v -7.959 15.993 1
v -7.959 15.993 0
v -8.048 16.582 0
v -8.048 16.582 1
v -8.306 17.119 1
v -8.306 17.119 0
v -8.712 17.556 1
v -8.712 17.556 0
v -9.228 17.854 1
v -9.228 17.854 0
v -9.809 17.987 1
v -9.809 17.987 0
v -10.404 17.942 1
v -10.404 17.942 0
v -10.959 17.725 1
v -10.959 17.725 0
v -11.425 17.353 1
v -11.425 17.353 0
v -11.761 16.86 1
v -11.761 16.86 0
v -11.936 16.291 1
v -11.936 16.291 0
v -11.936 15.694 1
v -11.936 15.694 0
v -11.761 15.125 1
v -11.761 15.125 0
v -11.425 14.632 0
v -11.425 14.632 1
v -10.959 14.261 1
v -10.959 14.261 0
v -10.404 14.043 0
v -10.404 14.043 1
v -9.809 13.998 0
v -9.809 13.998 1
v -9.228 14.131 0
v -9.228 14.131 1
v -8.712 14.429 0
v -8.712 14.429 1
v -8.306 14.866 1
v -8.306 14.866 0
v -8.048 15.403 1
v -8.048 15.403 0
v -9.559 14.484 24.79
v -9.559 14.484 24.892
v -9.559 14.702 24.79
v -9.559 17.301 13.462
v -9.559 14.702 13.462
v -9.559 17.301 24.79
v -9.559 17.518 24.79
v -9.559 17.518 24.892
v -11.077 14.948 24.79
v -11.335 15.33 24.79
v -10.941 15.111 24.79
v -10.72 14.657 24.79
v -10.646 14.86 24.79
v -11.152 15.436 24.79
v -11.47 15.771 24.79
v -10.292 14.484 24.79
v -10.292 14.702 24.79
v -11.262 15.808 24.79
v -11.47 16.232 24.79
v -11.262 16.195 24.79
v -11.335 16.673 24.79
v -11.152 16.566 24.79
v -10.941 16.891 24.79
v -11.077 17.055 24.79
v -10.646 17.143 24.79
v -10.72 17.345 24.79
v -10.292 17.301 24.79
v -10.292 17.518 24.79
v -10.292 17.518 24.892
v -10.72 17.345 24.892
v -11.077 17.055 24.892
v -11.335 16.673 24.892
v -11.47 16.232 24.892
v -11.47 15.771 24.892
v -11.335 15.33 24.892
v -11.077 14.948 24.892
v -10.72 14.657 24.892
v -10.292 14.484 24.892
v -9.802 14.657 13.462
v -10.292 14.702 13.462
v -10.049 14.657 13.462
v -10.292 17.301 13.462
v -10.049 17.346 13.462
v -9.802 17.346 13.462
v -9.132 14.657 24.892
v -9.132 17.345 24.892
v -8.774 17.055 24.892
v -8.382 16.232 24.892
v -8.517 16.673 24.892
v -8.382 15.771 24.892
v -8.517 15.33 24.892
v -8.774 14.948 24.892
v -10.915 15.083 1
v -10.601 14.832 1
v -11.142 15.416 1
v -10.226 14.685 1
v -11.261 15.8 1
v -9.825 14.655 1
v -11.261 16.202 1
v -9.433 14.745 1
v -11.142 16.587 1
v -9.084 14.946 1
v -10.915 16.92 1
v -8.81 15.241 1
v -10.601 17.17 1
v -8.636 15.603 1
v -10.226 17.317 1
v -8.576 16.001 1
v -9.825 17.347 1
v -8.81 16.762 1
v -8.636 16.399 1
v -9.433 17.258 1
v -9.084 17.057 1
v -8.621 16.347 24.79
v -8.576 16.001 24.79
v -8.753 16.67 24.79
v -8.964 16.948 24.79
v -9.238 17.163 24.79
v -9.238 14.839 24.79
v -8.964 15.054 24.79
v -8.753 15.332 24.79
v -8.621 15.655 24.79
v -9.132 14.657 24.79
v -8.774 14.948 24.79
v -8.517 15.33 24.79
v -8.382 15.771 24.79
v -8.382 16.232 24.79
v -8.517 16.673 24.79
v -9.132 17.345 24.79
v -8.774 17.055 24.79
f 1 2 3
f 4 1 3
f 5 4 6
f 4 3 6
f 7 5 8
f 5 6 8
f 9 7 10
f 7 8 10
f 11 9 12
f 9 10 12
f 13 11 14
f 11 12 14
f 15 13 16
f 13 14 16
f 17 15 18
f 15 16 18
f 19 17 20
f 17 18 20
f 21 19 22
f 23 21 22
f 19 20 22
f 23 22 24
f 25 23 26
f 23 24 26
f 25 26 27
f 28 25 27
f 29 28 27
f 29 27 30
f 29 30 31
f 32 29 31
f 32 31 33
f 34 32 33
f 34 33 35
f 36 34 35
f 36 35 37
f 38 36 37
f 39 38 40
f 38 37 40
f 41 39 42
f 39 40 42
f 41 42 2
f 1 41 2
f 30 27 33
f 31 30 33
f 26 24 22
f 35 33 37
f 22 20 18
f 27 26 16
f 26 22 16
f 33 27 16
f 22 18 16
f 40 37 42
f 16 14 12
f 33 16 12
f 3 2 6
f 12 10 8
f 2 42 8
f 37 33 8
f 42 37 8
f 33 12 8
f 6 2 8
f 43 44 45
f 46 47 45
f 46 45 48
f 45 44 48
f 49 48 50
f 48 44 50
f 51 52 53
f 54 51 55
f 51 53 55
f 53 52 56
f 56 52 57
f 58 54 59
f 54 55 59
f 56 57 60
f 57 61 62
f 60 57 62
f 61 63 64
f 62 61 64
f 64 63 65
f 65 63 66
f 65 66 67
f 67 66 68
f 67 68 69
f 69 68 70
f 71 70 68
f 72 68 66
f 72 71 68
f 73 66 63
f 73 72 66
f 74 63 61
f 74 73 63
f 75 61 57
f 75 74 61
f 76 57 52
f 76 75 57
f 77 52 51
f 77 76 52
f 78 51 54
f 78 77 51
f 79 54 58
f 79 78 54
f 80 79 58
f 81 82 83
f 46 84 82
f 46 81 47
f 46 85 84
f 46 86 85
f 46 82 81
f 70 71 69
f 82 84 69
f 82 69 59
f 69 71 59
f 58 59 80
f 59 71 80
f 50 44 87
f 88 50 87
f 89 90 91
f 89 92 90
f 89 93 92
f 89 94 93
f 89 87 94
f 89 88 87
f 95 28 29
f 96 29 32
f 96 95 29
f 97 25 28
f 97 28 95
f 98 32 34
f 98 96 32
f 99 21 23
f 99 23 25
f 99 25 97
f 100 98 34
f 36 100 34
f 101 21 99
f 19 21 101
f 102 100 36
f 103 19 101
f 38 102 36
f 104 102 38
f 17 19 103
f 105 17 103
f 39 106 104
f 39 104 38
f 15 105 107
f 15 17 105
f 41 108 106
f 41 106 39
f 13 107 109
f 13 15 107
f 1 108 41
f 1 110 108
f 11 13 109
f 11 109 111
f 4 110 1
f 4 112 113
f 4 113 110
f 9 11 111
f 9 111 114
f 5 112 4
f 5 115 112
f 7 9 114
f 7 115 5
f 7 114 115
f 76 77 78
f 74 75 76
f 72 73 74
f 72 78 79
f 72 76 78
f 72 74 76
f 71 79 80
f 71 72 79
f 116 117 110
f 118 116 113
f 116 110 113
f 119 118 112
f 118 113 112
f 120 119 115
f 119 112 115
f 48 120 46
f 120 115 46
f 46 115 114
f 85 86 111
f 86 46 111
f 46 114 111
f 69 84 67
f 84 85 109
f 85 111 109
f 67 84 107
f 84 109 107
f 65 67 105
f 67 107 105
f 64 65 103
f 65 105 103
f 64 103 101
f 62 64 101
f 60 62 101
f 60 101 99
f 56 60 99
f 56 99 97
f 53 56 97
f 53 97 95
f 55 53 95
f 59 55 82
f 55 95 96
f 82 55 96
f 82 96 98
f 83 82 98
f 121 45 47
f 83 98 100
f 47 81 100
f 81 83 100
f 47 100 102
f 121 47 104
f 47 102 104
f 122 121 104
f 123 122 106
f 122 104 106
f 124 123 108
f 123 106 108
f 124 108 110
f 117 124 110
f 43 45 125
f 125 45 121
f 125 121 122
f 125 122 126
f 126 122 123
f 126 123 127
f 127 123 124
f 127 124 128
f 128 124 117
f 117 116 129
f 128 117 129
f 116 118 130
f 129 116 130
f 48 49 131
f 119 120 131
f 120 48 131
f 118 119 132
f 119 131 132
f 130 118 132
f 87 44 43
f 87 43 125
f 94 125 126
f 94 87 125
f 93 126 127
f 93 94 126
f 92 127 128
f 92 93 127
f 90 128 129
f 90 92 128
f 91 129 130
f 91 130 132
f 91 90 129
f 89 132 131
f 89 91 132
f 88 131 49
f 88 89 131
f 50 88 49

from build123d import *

# Parameters (mm, degrees)
F0_R     = 2
F1_DEPTH = 1
F2_R     = 1.35
F3_DEPTH = 24.892
F4_R     = 1.560852
F4_R_2   = 1.35
F5_DEPTH = 0.1016
F7_DEPTH = 11.43


with BuildPart() as f1:
    # F0 (on Top) → F1 (new body)
    with BuildSketch(Plane.XY):
        with Locations((-9.958773, 15.992578)):
            Circle(F0_R)
    extrude(amount=F1_DEPTH)

    # F2 (on face) → F3 (join)
    with BuildSketch(Plane.XY):
        with Locations((-9.925794, 16.001273)):
            Circle(F2_R)
    extrude(amount=F3_DEPTH)

    # F4 (on face) → F5 (join)
    with BuildSketch(Plane.XY.offset(24.892)):
        with Locations((-9.925794, 16.001273)):
            Circle(F4_R)
        with Locations((-9.925794, 16.001273)):
            Circle(F4_R_2, mode=Mode.SUBTRACT)
    extrude(amount=-F5_DEPTH)

    # F6 (on face) → F7 (cut)
    with BuildSketch(Plane.XY.offset(24.892)):
        with BuildLine():
            ThreePointArc((-10.292375, 14.484079), (-9.925794, 14.440421), (-9.559213, 14.484079))
            Line((-9.559213, 14.484079), (-9.559213, 17.518467))
            ThreePointArc((-9.559213, 17.518467), (-9.925794, 17.562125), (-10.292375, 17.518467))
            Line((-10.292375, 17.518467), (-10.292375, 14.484079))
        make_face()
    extrude(amount=-F7_DEPTH, mode=Mode.SUBTRACT)


solid = f1.part
